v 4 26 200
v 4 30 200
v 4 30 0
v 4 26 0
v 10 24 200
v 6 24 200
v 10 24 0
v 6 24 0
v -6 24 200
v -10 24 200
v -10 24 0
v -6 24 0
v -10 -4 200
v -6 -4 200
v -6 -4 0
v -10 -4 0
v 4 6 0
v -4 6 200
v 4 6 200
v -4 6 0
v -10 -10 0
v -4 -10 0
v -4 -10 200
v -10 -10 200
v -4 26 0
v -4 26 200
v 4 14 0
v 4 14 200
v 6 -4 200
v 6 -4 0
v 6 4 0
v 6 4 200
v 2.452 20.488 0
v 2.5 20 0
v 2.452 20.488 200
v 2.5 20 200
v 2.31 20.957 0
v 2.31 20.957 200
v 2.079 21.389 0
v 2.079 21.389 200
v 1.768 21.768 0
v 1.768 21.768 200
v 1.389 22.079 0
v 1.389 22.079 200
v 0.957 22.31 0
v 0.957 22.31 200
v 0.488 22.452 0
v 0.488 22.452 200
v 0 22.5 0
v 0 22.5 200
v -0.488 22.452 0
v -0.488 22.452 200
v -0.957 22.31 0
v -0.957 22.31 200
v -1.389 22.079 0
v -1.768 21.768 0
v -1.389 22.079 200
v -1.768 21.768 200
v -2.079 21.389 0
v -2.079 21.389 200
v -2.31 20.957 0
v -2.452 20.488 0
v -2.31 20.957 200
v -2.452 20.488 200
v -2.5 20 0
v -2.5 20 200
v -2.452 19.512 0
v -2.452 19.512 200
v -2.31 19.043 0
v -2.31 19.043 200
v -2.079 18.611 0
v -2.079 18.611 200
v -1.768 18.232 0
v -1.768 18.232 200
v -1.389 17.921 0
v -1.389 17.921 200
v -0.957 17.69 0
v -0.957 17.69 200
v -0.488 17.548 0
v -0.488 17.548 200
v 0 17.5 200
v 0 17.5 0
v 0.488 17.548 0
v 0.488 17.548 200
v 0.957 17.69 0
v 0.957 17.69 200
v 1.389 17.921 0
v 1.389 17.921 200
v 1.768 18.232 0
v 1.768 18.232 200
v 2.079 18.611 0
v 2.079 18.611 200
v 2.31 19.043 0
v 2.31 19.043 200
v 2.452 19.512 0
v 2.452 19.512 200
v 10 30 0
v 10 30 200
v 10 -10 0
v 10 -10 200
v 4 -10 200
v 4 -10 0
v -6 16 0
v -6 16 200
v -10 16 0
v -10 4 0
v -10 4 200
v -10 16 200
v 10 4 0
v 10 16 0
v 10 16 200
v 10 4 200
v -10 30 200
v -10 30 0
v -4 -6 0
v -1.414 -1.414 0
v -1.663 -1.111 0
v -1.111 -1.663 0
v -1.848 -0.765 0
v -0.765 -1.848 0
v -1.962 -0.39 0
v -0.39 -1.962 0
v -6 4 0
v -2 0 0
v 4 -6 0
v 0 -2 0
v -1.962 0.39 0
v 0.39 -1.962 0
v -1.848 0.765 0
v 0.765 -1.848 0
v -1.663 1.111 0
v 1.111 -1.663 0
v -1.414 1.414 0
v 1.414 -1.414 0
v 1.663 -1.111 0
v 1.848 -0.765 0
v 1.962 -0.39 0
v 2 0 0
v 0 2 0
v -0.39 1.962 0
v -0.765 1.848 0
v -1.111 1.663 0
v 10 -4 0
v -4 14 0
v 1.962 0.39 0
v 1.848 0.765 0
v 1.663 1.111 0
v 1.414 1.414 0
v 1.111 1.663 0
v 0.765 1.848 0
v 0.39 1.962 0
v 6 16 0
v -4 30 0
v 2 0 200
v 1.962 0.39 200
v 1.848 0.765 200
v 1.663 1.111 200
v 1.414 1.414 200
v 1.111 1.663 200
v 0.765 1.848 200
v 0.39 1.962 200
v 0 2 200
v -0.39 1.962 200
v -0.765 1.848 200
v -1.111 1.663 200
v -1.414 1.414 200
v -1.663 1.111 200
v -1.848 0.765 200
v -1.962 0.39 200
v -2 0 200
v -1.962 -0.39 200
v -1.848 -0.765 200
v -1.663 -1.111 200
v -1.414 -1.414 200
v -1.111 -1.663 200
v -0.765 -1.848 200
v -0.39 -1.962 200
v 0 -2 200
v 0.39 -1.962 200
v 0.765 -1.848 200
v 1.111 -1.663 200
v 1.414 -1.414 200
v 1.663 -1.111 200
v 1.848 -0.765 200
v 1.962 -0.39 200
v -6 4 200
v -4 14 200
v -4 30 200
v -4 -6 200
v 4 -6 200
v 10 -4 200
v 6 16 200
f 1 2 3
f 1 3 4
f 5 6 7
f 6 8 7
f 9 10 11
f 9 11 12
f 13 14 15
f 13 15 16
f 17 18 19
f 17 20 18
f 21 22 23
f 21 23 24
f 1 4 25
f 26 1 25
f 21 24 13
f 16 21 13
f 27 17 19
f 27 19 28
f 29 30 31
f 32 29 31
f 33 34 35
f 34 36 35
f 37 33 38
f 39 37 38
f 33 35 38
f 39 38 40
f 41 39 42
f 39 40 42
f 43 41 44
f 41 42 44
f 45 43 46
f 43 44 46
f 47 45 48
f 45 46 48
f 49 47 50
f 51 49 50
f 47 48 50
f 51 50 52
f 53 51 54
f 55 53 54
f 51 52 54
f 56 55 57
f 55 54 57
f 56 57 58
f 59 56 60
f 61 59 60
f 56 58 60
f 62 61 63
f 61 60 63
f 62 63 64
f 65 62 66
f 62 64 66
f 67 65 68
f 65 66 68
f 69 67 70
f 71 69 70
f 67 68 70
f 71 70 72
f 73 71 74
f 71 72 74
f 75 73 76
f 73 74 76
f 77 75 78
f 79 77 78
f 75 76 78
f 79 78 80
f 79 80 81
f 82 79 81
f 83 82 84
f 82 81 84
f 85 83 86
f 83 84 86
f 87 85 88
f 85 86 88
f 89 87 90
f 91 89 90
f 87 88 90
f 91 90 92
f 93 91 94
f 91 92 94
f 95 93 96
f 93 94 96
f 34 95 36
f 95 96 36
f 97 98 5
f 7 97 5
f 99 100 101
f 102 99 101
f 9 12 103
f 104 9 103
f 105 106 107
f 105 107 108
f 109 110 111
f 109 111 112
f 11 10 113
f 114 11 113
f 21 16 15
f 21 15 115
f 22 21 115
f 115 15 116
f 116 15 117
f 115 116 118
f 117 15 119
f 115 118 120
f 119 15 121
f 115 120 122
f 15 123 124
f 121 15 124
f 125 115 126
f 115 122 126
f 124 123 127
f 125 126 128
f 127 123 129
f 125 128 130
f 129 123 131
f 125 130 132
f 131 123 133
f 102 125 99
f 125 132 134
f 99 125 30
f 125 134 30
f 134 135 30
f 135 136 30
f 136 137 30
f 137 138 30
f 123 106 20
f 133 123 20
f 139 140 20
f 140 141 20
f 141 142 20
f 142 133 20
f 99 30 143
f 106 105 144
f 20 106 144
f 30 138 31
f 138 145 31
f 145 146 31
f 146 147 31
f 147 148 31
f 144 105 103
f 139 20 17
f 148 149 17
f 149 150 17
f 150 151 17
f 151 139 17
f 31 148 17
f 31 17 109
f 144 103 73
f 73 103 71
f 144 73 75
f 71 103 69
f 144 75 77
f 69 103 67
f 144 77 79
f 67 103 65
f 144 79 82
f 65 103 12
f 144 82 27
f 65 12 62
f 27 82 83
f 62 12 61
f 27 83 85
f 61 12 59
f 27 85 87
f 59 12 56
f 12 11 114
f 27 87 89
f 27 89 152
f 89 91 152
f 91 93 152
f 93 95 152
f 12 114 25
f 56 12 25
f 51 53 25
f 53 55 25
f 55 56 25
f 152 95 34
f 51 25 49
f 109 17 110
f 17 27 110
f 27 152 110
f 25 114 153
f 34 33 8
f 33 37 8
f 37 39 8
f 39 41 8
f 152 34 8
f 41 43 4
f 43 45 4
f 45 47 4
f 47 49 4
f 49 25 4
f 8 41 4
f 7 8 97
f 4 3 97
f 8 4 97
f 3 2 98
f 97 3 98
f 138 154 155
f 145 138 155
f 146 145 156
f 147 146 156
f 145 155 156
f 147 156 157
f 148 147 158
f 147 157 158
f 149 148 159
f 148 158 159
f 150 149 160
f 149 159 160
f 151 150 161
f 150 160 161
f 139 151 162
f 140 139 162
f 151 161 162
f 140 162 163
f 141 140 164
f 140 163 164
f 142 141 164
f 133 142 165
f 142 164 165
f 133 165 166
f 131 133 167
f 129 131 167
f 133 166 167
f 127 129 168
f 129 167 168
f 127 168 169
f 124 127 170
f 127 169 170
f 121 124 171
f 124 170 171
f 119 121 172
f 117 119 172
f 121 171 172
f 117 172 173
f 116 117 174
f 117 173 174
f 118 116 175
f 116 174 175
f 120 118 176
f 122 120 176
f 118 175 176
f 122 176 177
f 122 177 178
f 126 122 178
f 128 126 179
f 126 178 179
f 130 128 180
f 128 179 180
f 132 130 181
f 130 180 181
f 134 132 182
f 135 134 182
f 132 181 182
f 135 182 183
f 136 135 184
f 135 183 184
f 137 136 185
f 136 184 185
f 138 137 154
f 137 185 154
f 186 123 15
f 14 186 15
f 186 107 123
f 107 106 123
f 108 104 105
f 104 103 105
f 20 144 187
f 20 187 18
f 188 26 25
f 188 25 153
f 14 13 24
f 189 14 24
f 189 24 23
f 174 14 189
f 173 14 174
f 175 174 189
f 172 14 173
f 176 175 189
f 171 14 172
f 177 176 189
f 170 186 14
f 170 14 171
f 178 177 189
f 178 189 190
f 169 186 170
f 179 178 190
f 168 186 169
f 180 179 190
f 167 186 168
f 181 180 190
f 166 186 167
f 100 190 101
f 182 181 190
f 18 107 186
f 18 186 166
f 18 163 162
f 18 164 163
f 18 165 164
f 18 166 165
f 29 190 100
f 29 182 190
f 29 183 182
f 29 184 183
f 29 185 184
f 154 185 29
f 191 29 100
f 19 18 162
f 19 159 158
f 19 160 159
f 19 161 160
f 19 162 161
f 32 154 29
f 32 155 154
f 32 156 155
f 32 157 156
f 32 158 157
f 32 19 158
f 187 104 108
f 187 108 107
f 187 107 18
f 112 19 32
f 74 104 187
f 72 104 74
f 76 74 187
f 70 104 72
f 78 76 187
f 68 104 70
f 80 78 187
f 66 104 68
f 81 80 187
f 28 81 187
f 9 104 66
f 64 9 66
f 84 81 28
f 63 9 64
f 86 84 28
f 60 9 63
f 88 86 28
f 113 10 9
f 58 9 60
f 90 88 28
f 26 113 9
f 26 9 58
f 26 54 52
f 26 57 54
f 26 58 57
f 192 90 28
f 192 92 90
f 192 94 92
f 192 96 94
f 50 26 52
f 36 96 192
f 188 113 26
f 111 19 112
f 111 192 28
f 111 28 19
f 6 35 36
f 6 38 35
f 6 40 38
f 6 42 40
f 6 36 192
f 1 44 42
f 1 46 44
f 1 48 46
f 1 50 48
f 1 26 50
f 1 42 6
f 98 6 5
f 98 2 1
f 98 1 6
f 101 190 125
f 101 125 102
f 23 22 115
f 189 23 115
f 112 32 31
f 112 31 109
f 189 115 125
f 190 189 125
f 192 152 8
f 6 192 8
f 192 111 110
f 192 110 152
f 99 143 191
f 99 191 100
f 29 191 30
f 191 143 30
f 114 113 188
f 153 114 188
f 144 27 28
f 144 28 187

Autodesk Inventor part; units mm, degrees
ref_plane "YZ Plane" through (0, 0, 0) normal (1, 0, 0) x (0, 1, 0)
ref_plane "XZ Plane" through (0, 0, 0) normal (0, 1, 0) x (-1, 0, 0)
ref_plane "XY Plane" through (0, 0, 0) normal (0, 0, 1) x (1, 0, 0)
sketch "Sketch1" plane through (0, 0, 0) normal (0, 0, 1) x (1, 0, 0)
  line L0 (10, -10) -> (-10, 10) construction
  line L1 (-10, -10) -> (10, 10) construction
  line L2 (-4, 6) -> (4, 6)
  line L3 (4, 6) -> (4, 14)
  line L4 (4, 14) -> (-4, 14)
  line L5 (-4, 14) -> (-4, 6)
  line L6 (-4, 6) -> (4, 14) construction
  line L7 (4, 6) -> (-4, 14) construction
  line L8 (14, -4) -> (6, -4)
  line L9 (6, -4) -> (6, 4)
  line L10 (6, 4) -> (14, 4)
  line L11 (14, 4) -> (14, -4)
  line L12 (14, -4) -> (6, 4) construction
  line L13 (6, -4) -> (14, 4) construction
  line L14 (-4, -6) -> (4, -6)
  line L15 (4, -6) -> (4, -14)
  line L16 (4, -14) -> (-4, -14)
  line L17 (-4, -14) -> (-4, -6)
  line L18 (-4, -6) -> (4, -14) construction
  line L19 (4, -6) -> (-4, -14) construction
  line L20 (-14, 4) -> (-6, 4)
  line L21 (-6, 4) -> (-6, -4)
  line L22 (-6, -4) -> (-14, -4)
  line L23 (-14, -4) -> (-14, 4)
  line L24 (-14, 4) -> (-6, -4) construction
  line L25 (-6, 4) -> (-14, -4) construction
  line L26 (-10, -10) -> (-10, 0)
  line L27 (-10, 4) -> (-10, 10)
  line L28 (-10, 10) -> (0, 10)
  line L29 (4, 10) -> (10, 10)
  line L30 (10, 10) -> (10, 4)
  line L31 (10, 0) -> (10, -10)
  line L32 (10, -10) -> (4, -10)
  line L33 (0, -10) -> (-10, -10)
  point P0 (0, 0)
  point P1 (-4, 10)
  point P2 (10, -4)
  point P3 (-4, -10)
  point P4 (-10, -4)
  dimension "d0" = 20
  dimension "d1" = 20
  dimension "d2" = 8
  dimension "d3" = 8
  dimension "d4" = 8
  dimension "d5" = 8
  dimension "d6" = 8
  dimension "d7" = 8
  dimension "d8" = 8
  dimension "d9" = 8
extrude "Extrusion1" add sketch "Sketch1" along normal blind 200 contours L2 L3 L29 L30 L10 L9 L8 L31 L32 L15 L14 L17 L33 L26 L22 L21 L20 L27 L28 L5
ref_plane "Work Plane1" through (4, 0, 0) normal (0, 1, 0) x (1, 0, 0)
ref_plane "Work Plane2" through (0, -10, 0) normal (1, 0, 0) x (0, 0, -1)
mirror "Mirror1" about plane through (10, 10, 0) normal (0, 1, 0) of "Extrusion1"
sketch "Sketch2" plane through (0, 0, 200) normal (0, 0, 1) x (1, 0, 0)
  line L0 (-10, 4) -> (-10, 16) projected
  line L1 (-10, 4) -> (-6, 4) projected
  line L2 (-6, 4) -> (-6, -4) projected
  line L3 (-6, -4) -> (-10, -4) projected
  line L4 (-10, -4) -> (-10, -10) projected
  line L5 (-10, -10) -> (-4, -10) projected
  line L6 (-4, -10) -> (-4, -6) projected
  line L7 (-4, -6) -> (4, -6) projected
  line L8 (4, -6) -> (4, -10) projected
  line L9 (4, -10) -> (10, -10) projected
  line L10 (10, -10) -> (10, -4) projected
  line L11 (10, -4) -> (6, -4) projected
  line L12 (6, -4) -> (6, 4) projected
  line L13 (6, 4) -> (10, 4) projected
  line L14 (10, 4) -> (10, 16) projected
  line L15 (6, 16) -> (10, 16) projected
  line L16 (6, 24) -> (6, 16) projected
  line L17 (10, 24) -> (6, 24) projected
  line L18 (10, 30) -> (10, 24) projected
  line L19 (4, 30) -> (10, 30) projected
  line L20 (4, 26) -> (4, 30) projected
  line L21 (-4, 26) -> (4, 26) projected
  line L22 (-4, 30) -> (-4, 26) projected
  line L23 (-10, 30) -> (-4, 30) projected
  line L24 (-10, 24) -> (-10, 30) projected
  line L25 (-6, 24) -> (-10, 24) projected
  line L26 (-6, 16) -> (-6, 24) projected
  line L27 (-10, 16) -> (-6, 16) projected
  line L28 (-4, 6) -> (-4, 14) projected
  line L29 (4, 14) -> (-4, 14) projected
  line L30 (4, 6) -> (4, 14) projected
  line L31 (4, 6) -> (-4, 6) projected
  circle A0 centre (0, 20) radius 2.5
  circle A1 centre (0, 0) radius 2
  point P0 (0, 0)
  dimension "d12" = 5
  dimension "d13" = 4
  dimension "d14" = 20
  dimension "d15" = 10
extrude "Extrusion2" cut sketch "Sketch2" against normal through all contours A0 | A1
ref_plane "Work Plane3" through (0, 4, 200) normal (1, 0, 0) x (0, 0, -1)
properties part number "Neje_Base_Rod_20mm"
